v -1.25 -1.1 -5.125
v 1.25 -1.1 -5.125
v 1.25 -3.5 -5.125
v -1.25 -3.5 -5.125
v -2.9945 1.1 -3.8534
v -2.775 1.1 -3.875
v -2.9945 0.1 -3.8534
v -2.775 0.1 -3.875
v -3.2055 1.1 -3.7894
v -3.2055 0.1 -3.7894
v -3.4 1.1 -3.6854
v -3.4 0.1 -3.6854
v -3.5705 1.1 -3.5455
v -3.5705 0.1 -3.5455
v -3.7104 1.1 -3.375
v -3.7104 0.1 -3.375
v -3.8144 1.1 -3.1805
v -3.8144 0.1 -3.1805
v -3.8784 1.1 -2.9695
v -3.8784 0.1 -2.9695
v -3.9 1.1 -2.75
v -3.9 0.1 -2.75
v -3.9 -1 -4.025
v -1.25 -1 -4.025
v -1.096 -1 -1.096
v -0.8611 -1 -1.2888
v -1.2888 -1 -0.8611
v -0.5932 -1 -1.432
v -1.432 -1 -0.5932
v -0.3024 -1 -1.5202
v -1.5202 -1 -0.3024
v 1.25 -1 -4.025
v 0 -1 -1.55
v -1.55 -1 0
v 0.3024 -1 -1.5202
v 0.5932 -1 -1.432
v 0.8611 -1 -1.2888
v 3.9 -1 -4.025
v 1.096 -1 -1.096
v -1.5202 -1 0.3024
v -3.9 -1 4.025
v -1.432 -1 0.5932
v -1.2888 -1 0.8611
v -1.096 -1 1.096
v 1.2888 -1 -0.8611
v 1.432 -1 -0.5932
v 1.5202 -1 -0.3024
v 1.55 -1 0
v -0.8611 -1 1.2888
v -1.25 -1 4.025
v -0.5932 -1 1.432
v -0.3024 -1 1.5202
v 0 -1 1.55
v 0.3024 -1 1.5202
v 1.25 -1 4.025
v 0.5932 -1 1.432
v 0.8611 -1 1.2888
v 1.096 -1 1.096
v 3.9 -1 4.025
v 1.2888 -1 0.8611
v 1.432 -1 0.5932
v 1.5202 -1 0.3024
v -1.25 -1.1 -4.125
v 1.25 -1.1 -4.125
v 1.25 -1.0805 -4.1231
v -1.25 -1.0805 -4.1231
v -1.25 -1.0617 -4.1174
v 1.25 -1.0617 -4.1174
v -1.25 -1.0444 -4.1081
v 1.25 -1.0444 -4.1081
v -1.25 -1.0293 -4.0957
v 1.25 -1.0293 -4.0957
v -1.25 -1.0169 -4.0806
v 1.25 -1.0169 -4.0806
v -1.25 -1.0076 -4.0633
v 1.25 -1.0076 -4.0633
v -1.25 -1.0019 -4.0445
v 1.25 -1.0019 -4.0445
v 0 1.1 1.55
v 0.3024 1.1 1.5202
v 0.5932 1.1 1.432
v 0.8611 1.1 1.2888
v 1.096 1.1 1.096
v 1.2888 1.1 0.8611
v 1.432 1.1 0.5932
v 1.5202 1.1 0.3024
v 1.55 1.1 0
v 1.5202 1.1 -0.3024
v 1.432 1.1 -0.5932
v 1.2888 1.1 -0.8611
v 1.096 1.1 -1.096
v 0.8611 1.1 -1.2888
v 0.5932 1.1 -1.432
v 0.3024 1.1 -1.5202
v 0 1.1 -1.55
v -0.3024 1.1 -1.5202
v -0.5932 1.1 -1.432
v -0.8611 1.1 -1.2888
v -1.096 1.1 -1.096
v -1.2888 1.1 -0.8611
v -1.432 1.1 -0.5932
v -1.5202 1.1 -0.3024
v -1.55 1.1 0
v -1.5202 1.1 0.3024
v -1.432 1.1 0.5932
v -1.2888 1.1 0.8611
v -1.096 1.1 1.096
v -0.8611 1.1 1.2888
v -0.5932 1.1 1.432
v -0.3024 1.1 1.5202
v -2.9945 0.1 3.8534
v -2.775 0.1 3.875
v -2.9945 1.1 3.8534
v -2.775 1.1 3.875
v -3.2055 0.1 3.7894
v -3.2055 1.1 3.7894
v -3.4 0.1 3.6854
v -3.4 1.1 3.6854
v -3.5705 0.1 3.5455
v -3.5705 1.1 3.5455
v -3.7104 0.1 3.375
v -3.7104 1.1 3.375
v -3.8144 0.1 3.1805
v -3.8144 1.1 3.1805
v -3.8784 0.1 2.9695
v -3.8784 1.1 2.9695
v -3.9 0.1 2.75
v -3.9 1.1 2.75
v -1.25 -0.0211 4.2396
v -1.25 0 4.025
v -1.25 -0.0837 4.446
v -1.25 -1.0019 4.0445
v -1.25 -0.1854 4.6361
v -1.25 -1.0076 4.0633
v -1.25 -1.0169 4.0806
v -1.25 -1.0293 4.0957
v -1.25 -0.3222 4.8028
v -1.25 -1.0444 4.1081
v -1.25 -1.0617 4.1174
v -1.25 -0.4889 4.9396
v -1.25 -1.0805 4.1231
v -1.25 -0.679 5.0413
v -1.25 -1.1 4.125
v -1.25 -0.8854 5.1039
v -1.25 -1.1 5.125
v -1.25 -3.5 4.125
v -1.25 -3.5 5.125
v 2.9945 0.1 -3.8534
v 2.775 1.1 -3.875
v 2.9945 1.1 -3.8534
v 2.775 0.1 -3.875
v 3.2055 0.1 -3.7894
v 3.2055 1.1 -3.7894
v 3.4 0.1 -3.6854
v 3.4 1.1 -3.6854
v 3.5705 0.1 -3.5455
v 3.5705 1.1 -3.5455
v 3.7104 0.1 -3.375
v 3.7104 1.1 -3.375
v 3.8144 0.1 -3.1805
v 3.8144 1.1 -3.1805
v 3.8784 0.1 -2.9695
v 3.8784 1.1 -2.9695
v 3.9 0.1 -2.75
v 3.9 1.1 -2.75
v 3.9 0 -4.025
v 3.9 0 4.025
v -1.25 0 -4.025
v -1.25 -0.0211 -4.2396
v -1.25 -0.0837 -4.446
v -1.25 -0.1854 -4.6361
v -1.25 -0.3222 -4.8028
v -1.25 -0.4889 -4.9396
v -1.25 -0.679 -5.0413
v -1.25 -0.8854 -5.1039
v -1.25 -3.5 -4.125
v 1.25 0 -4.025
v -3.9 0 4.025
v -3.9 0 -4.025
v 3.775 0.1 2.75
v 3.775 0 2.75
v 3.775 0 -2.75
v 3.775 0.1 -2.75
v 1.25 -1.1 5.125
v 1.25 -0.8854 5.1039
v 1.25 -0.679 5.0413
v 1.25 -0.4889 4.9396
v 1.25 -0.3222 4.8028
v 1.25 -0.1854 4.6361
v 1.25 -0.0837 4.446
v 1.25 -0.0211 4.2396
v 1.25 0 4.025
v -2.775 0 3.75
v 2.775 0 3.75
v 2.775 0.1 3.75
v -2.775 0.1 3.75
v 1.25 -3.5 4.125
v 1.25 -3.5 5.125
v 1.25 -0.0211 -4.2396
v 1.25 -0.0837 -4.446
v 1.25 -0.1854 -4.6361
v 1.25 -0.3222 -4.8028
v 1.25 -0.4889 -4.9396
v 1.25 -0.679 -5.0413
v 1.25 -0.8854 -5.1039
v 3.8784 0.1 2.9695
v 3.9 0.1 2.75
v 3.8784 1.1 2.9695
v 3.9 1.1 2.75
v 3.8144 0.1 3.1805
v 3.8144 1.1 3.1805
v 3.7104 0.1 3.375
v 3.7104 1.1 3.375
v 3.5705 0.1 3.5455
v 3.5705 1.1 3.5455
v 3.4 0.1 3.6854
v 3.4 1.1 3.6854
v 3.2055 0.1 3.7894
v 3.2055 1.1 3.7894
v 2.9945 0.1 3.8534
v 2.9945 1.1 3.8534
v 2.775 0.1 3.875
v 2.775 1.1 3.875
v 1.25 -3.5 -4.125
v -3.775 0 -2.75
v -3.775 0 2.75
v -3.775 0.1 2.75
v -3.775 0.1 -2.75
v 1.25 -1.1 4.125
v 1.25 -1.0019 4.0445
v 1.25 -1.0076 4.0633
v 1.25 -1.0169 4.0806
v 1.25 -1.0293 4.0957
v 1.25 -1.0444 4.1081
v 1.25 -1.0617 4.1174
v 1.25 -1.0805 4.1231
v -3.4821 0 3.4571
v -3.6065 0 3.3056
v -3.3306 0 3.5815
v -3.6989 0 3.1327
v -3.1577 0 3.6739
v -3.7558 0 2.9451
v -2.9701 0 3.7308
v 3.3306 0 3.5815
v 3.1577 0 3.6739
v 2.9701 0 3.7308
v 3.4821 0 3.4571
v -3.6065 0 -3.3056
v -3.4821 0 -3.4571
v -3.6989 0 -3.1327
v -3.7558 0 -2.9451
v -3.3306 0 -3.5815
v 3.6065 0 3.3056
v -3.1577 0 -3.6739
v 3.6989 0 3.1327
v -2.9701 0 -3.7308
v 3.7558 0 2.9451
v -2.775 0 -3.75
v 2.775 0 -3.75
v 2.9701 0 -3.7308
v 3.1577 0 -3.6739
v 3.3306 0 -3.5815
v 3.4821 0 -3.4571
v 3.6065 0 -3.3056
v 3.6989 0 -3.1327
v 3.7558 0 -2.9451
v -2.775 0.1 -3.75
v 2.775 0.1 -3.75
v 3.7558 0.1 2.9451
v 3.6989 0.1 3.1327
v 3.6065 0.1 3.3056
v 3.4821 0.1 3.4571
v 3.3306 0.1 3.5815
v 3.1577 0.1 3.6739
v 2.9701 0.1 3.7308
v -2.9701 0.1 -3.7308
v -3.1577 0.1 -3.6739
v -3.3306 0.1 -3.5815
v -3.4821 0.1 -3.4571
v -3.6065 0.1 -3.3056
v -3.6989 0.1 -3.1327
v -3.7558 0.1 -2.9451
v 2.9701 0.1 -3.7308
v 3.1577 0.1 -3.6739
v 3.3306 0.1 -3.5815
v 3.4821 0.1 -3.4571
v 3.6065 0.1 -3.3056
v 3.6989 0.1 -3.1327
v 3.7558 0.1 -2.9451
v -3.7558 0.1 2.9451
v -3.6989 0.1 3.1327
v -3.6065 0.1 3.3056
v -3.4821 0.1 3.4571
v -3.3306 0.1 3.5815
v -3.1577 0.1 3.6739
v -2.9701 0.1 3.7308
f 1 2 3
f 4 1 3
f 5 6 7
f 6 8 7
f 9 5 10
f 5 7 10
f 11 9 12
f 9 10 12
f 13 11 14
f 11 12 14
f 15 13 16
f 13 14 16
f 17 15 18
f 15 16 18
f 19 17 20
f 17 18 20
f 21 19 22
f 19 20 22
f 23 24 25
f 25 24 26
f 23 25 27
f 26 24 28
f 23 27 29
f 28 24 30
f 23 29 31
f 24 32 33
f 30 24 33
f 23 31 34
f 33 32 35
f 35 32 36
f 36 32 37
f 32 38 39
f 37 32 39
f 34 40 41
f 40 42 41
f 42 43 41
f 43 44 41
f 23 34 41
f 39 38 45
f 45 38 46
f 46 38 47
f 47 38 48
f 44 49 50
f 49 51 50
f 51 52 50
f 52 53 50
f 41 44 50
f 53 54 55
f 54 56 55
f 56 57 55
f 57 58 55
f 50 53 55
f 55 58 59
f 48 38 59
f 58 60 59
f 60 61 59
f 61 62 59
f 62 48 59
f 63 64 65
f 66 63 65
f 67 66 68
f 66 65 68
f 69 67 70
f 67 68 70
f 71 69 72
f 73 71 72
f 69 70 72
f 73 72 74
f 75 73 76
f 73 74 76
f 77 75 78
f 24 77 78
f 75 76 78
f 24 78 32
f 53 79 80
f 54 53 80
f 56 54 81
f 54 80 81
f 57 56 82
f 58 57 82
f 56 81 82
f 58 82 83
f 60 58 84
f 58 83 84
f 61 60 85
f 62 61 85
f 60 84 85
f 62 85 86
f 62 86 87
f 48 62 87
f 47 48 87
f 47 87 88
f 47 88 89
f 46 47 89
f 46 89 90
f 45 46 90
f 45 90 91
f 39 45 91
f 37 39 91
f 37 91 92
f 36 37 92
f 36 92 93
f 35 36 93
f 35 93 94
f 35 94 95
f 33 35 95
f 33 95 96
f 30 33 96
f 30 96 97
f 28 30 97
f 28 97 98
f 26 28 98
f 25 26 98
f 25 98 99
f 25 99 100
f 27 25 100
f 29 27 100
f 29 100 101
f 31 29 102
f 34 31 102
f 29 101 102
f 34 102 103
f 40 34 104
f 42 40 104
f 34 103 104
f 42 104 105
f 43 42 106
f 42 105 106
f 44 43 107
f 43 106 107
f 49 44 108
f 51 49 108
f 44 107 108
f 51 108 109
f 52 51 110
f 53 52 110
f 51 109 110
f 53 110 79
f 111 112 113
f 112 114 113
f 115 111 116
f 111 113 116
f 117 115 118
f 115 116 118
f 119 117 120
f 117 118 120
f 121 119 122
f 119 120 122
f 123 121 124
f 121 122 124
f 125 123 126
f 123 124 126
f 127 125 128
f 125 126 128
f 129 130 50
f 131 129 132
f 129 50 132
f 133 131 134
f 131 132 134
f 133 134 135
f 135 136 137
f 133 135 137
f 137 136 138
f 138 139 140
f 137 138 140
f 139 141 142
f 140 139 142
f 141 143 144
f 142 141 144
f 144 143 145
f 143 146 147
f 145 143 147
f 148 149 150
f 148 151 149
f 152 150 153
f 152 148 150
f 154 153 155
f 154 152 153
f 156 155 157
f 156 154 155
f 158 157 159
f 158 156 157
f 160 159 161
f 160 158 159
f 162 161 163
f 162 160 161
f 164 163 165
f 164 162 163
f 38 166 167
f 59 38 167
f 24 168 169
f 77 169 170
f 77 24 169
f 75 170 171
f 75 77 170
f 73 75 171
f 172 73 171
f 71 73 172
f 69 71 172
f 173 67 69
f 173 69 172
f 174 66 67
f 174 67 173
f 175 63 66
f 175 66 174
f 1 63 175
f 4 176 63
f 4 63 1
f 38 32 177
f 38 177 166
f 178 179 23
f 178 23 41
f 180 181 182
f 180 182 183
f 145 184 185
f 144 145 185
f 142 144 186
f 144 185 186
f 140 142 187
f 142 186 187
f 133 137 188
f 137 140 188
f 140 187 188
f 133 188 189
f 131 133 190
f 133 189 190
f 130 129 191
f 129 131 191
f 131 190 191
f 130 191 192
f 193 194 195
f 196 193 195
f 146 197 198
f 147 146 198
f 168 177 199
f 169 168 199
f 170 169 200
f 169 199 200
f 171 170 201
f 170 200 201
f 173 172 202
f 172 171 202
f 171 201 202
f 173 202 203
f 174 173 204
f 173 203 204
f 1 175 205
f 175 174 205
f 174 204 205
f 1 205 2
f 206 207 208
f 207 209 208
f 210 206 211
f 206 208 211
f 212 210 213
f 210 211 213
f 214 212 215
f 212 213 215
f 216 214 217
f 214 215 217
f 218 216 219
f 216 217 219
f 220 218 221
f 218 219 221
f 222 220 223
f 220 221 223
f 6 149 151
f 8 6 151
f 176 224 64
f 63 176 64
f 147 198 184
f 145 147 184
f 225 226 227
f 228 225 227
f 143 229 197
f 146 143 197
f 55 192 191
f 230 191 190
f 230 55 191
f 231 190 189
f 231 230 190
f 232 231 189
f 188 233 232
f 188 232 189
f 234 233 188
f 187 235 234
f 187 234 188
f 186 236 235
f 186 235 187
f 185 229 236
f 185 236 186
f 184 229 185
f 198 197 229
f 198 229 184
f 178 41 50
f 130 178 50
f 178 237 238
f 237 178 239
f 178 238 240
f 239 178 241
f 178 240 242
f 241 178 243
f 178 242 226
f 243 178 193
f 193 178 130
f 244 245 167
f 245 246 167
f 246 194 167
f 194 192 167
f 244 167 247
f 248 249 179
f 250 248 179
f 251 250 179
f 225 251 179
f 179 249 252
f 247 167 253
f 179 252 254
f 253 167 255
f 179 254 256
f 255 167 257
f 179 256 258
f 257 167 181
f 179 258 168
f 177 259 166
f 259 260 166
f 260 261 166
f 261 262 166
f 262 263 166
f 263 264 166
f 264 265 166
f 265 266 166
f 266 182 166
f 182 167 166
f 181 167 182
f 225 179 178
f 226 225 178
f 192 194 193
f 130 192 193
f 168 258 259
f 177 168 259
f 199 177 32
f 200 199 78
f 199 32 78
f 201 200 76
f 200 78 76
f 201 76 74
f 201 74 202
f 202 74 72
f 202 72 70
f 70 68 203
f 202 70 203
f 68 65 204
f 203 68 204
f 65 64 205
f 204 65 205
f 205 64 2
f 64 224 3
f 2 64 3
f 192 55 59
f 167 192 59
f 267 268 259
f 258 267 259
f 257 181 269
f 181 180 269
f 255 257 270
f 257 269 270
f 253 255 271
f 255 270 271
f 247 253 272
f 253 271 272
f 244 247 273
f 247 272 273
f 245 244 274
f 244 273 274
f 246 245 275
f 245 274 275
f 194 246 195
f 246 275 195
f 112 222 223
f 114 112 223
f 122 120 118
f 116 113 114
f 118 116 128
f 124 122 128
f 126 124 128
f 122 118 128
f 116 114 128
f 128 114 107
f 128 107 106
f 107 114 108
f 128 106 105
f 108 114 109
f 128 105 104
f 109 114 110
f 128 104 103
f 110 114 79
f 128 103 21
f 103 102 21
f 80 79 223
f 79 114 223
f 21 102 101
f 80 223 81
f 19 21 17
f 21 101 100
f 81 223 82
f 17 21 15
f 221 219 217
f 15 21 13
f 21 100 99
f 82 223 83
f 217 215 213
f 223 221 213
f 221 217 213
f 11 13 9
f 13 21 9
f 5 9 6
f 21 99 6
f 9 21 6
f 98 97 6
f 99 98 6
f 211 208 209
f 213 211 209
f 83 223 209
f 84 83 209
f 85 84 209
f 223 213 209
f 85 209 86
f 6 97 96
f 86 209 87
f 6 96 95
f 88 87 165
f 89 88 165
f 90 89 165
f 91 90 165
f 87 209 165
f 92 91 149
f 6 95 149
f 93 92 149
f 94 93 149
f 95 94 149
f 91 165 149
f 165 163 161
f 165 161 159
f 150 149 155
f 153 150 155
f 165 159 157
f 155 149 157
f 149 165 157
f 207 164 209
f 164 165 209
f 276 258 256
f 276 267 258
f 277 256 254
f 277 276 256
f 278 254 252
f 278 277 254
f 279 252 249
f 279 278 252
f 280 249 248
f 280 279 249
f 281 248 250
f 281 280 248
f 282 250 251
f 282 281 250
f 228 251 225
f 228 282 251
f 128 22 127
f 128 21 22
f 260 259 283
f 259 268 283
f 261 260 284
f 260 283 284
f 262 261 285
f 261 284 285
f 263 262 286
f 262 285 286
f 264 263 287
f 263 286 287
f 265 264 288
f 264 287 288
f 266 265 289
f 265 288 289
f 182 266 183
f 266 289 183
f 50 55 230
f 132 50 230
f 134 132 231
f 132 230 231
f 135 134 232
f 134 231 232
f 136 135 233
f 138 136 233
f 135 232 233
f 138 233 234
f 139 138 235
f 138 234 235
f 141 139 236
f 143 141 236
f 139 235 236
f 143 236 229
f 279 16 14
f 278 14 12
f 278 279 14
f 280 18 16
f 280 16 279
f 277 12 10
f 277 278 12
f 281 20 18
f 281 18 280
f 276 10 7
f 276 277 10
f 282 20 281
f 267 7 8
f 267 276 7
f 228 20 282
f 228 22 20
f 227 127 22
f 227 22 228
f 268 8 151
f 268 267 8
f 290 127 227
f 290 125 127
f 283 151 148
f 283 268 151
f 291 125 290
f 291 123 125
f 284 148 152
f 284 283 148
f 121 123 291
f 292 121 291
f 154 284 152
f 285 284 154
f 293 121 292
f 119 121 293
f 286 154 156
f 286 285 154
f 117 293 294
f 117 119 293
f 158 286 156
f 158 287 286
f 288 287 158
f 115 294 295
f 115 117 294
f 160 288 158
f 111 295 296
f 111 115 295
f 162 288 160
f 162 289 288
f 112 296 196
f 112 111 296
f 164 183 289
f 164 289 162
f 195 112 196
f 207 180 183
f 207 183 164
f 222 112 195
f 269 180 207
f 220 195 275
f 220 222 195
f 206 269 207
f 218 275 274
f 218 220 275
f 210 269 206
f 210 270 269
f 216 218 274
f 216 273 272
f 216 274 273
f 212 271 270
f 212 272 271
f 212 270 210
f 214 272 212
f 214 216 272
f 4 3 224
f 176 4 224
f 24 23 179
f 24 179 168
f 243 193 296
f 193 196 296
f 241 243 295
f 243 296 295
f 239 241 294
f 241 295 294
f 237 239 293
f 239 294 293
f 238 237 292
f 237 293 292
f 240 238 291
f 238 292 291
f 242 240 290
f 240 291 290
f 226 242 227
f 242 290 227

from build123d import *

# Parameters (mm, degrees)
BOSS_EXTRUDE1_DEPTH = 3.9
SKETCH2_W           = 0.125
SKETCH2_H           = 0.1
CUT_EXTRUDE1_DEPTH  = 11.306581635
FILLET1_R           = 1
FILLET2_R           = 1.125
SKETCH3_W           = 2.65
SKETCH3_H           = 1.1
CUT_EXTRUDE2_DEPTH  = 8.91426718
SKETCH4_R           = 1.55
CUT_EXTRUDE3_DEPTH  = 8.91426718


with BuildPart() as part:
    # Sketch1 → Boss-Extrude1 (new, symmetric)
    with BuildSketch(Plane(origin=(0, 0, 0), x_dir=(0, 0, -1), z_dir=(1, 0, 0))):
        with BuildLine():
            Line((-5.125, -3.5), (-5.125, -1.1))
            ThreePointArc((-5.125, -1.1), (-4.802817459, -0.322182541), (-4.025, 0))
            Line((-4.025, 0), (-3.75, 0))
            Line((-3.75, 0), (-3.75, 0.1))
            Line((-3.75, 0.1), (-3.875, 0.1))
            Line((-3.875, 0.1), (-3.875, 1.1))
            Line((-3.875, 1.1), (3.875, 1.1))
            Line((3.875, 1.1), (3.875, 0.1))
            Line((3.875, 0.1), (3.75, 0.1))
            Line((3.75, 0.1), (3.75, 0))
            Line((3.75, 0), (4.025, 0))
            ThreePointArc((4.025, 0), (4.802817459, -0.322182541), (5.125, -1.1))
            Line((5.125, -1.1), (5.125, -3.5))
            Line((5.125, -3.5), (4.125, -3.5))
            Line((4.125, -3.5), (4.125, -1.1))
            ThreePointArc((4.125, -1.1), (4.095710678, -1.029289322), (4.025, -1))
            Line((4.025, -1), (-4.025, -1))
            ThreePointArc((-4.025, -1), (-4.095710678, -1.029289322), (-4.125, -1.1))
            Line((-4.125, -1.1), (-4.125, -3.5))
            Line((-4.125, -3.5), (-5.125, -3.5))
        make_face()
    extrude(amount=BOSS_EXTRUDE1_DEPTH, both=True)

    # Sketch2 → Cut-Extrude1 (cut, through all)
    with BuildSketch(Plane.XY.offset(3.75)):
        with Locations((3.8375, 0.05)):
            Rectangle(SKETCH2_W, SKETCH2_H)
        with Locations((-3.8375, 0.05)):
            Rectangle(SKETCH2_W, SKETCH2_H)
    extrude(amount=-CUT_EXTRUDE1_DEPTH, mode=Mode.SUBTRACT)

    # Fillet1
    fillet1_edges = [part.edges().sort_by_distance(p)[0] for p in [
        (3.775, 0.05, -3.75),
        (3.775, 0.05, 3.75),
        (-3.775, 0.05, -3.75),
        (-3.775, 0.05, 3.75),
    ]]
    fillet(fillet1_edges, radius=FILLET1_R)

    # Fillet2
    fillet2_edges = [part.edges().sort_by_distance(p)[0] for p in [
        (-3.9, 0.6, 3.875),
        (-3.9, 0.6, -3.875),
        (3.9, 0.6, -3.875),
        (3.9, 0.6, 3.875),
    ]]
    fillet(fillet2_edges, radius=FILLET2_R)

    # Sketch3 → Cut-Extrude2 (cut, through all)
    with BuildSketch(Plane.XZ.offset(3.5)):
        with Locations((2.575, 4.575)):
            Rectangle(SKETCH3_W, SKETCH3_H)
        with Locations((-2.575, 4.575)):
            Rectangle(SKETCH3_W, SKETCH3_H)
    cut_extrude2 = extrude(amount=-CUT_EXTRUDE2_DEPTH, mode=Mode.SUBTRACT)

    # Mirror1: Cut-Extrude2 across plane
    add(cut_extrude2.mirror(Plane.XY), mode=Mode.SUBTRACT)

    # Sketch4 → Cut-Extrude3 (cut, through all)
    with BuildSketch(Plane(origin=(0, 1.1, 0), x_dir=(1, 0, 0), z_dir=(0, 1, 0))):
        with Locations(Location((0, 0, 0), (0, 0, 270))):
            Circle(SKETCH4_R)
    extrude(amount=-CUT_EXTRUDE3_DEPTH, mode=Mode.SUBTRACT)


solid = part.part
